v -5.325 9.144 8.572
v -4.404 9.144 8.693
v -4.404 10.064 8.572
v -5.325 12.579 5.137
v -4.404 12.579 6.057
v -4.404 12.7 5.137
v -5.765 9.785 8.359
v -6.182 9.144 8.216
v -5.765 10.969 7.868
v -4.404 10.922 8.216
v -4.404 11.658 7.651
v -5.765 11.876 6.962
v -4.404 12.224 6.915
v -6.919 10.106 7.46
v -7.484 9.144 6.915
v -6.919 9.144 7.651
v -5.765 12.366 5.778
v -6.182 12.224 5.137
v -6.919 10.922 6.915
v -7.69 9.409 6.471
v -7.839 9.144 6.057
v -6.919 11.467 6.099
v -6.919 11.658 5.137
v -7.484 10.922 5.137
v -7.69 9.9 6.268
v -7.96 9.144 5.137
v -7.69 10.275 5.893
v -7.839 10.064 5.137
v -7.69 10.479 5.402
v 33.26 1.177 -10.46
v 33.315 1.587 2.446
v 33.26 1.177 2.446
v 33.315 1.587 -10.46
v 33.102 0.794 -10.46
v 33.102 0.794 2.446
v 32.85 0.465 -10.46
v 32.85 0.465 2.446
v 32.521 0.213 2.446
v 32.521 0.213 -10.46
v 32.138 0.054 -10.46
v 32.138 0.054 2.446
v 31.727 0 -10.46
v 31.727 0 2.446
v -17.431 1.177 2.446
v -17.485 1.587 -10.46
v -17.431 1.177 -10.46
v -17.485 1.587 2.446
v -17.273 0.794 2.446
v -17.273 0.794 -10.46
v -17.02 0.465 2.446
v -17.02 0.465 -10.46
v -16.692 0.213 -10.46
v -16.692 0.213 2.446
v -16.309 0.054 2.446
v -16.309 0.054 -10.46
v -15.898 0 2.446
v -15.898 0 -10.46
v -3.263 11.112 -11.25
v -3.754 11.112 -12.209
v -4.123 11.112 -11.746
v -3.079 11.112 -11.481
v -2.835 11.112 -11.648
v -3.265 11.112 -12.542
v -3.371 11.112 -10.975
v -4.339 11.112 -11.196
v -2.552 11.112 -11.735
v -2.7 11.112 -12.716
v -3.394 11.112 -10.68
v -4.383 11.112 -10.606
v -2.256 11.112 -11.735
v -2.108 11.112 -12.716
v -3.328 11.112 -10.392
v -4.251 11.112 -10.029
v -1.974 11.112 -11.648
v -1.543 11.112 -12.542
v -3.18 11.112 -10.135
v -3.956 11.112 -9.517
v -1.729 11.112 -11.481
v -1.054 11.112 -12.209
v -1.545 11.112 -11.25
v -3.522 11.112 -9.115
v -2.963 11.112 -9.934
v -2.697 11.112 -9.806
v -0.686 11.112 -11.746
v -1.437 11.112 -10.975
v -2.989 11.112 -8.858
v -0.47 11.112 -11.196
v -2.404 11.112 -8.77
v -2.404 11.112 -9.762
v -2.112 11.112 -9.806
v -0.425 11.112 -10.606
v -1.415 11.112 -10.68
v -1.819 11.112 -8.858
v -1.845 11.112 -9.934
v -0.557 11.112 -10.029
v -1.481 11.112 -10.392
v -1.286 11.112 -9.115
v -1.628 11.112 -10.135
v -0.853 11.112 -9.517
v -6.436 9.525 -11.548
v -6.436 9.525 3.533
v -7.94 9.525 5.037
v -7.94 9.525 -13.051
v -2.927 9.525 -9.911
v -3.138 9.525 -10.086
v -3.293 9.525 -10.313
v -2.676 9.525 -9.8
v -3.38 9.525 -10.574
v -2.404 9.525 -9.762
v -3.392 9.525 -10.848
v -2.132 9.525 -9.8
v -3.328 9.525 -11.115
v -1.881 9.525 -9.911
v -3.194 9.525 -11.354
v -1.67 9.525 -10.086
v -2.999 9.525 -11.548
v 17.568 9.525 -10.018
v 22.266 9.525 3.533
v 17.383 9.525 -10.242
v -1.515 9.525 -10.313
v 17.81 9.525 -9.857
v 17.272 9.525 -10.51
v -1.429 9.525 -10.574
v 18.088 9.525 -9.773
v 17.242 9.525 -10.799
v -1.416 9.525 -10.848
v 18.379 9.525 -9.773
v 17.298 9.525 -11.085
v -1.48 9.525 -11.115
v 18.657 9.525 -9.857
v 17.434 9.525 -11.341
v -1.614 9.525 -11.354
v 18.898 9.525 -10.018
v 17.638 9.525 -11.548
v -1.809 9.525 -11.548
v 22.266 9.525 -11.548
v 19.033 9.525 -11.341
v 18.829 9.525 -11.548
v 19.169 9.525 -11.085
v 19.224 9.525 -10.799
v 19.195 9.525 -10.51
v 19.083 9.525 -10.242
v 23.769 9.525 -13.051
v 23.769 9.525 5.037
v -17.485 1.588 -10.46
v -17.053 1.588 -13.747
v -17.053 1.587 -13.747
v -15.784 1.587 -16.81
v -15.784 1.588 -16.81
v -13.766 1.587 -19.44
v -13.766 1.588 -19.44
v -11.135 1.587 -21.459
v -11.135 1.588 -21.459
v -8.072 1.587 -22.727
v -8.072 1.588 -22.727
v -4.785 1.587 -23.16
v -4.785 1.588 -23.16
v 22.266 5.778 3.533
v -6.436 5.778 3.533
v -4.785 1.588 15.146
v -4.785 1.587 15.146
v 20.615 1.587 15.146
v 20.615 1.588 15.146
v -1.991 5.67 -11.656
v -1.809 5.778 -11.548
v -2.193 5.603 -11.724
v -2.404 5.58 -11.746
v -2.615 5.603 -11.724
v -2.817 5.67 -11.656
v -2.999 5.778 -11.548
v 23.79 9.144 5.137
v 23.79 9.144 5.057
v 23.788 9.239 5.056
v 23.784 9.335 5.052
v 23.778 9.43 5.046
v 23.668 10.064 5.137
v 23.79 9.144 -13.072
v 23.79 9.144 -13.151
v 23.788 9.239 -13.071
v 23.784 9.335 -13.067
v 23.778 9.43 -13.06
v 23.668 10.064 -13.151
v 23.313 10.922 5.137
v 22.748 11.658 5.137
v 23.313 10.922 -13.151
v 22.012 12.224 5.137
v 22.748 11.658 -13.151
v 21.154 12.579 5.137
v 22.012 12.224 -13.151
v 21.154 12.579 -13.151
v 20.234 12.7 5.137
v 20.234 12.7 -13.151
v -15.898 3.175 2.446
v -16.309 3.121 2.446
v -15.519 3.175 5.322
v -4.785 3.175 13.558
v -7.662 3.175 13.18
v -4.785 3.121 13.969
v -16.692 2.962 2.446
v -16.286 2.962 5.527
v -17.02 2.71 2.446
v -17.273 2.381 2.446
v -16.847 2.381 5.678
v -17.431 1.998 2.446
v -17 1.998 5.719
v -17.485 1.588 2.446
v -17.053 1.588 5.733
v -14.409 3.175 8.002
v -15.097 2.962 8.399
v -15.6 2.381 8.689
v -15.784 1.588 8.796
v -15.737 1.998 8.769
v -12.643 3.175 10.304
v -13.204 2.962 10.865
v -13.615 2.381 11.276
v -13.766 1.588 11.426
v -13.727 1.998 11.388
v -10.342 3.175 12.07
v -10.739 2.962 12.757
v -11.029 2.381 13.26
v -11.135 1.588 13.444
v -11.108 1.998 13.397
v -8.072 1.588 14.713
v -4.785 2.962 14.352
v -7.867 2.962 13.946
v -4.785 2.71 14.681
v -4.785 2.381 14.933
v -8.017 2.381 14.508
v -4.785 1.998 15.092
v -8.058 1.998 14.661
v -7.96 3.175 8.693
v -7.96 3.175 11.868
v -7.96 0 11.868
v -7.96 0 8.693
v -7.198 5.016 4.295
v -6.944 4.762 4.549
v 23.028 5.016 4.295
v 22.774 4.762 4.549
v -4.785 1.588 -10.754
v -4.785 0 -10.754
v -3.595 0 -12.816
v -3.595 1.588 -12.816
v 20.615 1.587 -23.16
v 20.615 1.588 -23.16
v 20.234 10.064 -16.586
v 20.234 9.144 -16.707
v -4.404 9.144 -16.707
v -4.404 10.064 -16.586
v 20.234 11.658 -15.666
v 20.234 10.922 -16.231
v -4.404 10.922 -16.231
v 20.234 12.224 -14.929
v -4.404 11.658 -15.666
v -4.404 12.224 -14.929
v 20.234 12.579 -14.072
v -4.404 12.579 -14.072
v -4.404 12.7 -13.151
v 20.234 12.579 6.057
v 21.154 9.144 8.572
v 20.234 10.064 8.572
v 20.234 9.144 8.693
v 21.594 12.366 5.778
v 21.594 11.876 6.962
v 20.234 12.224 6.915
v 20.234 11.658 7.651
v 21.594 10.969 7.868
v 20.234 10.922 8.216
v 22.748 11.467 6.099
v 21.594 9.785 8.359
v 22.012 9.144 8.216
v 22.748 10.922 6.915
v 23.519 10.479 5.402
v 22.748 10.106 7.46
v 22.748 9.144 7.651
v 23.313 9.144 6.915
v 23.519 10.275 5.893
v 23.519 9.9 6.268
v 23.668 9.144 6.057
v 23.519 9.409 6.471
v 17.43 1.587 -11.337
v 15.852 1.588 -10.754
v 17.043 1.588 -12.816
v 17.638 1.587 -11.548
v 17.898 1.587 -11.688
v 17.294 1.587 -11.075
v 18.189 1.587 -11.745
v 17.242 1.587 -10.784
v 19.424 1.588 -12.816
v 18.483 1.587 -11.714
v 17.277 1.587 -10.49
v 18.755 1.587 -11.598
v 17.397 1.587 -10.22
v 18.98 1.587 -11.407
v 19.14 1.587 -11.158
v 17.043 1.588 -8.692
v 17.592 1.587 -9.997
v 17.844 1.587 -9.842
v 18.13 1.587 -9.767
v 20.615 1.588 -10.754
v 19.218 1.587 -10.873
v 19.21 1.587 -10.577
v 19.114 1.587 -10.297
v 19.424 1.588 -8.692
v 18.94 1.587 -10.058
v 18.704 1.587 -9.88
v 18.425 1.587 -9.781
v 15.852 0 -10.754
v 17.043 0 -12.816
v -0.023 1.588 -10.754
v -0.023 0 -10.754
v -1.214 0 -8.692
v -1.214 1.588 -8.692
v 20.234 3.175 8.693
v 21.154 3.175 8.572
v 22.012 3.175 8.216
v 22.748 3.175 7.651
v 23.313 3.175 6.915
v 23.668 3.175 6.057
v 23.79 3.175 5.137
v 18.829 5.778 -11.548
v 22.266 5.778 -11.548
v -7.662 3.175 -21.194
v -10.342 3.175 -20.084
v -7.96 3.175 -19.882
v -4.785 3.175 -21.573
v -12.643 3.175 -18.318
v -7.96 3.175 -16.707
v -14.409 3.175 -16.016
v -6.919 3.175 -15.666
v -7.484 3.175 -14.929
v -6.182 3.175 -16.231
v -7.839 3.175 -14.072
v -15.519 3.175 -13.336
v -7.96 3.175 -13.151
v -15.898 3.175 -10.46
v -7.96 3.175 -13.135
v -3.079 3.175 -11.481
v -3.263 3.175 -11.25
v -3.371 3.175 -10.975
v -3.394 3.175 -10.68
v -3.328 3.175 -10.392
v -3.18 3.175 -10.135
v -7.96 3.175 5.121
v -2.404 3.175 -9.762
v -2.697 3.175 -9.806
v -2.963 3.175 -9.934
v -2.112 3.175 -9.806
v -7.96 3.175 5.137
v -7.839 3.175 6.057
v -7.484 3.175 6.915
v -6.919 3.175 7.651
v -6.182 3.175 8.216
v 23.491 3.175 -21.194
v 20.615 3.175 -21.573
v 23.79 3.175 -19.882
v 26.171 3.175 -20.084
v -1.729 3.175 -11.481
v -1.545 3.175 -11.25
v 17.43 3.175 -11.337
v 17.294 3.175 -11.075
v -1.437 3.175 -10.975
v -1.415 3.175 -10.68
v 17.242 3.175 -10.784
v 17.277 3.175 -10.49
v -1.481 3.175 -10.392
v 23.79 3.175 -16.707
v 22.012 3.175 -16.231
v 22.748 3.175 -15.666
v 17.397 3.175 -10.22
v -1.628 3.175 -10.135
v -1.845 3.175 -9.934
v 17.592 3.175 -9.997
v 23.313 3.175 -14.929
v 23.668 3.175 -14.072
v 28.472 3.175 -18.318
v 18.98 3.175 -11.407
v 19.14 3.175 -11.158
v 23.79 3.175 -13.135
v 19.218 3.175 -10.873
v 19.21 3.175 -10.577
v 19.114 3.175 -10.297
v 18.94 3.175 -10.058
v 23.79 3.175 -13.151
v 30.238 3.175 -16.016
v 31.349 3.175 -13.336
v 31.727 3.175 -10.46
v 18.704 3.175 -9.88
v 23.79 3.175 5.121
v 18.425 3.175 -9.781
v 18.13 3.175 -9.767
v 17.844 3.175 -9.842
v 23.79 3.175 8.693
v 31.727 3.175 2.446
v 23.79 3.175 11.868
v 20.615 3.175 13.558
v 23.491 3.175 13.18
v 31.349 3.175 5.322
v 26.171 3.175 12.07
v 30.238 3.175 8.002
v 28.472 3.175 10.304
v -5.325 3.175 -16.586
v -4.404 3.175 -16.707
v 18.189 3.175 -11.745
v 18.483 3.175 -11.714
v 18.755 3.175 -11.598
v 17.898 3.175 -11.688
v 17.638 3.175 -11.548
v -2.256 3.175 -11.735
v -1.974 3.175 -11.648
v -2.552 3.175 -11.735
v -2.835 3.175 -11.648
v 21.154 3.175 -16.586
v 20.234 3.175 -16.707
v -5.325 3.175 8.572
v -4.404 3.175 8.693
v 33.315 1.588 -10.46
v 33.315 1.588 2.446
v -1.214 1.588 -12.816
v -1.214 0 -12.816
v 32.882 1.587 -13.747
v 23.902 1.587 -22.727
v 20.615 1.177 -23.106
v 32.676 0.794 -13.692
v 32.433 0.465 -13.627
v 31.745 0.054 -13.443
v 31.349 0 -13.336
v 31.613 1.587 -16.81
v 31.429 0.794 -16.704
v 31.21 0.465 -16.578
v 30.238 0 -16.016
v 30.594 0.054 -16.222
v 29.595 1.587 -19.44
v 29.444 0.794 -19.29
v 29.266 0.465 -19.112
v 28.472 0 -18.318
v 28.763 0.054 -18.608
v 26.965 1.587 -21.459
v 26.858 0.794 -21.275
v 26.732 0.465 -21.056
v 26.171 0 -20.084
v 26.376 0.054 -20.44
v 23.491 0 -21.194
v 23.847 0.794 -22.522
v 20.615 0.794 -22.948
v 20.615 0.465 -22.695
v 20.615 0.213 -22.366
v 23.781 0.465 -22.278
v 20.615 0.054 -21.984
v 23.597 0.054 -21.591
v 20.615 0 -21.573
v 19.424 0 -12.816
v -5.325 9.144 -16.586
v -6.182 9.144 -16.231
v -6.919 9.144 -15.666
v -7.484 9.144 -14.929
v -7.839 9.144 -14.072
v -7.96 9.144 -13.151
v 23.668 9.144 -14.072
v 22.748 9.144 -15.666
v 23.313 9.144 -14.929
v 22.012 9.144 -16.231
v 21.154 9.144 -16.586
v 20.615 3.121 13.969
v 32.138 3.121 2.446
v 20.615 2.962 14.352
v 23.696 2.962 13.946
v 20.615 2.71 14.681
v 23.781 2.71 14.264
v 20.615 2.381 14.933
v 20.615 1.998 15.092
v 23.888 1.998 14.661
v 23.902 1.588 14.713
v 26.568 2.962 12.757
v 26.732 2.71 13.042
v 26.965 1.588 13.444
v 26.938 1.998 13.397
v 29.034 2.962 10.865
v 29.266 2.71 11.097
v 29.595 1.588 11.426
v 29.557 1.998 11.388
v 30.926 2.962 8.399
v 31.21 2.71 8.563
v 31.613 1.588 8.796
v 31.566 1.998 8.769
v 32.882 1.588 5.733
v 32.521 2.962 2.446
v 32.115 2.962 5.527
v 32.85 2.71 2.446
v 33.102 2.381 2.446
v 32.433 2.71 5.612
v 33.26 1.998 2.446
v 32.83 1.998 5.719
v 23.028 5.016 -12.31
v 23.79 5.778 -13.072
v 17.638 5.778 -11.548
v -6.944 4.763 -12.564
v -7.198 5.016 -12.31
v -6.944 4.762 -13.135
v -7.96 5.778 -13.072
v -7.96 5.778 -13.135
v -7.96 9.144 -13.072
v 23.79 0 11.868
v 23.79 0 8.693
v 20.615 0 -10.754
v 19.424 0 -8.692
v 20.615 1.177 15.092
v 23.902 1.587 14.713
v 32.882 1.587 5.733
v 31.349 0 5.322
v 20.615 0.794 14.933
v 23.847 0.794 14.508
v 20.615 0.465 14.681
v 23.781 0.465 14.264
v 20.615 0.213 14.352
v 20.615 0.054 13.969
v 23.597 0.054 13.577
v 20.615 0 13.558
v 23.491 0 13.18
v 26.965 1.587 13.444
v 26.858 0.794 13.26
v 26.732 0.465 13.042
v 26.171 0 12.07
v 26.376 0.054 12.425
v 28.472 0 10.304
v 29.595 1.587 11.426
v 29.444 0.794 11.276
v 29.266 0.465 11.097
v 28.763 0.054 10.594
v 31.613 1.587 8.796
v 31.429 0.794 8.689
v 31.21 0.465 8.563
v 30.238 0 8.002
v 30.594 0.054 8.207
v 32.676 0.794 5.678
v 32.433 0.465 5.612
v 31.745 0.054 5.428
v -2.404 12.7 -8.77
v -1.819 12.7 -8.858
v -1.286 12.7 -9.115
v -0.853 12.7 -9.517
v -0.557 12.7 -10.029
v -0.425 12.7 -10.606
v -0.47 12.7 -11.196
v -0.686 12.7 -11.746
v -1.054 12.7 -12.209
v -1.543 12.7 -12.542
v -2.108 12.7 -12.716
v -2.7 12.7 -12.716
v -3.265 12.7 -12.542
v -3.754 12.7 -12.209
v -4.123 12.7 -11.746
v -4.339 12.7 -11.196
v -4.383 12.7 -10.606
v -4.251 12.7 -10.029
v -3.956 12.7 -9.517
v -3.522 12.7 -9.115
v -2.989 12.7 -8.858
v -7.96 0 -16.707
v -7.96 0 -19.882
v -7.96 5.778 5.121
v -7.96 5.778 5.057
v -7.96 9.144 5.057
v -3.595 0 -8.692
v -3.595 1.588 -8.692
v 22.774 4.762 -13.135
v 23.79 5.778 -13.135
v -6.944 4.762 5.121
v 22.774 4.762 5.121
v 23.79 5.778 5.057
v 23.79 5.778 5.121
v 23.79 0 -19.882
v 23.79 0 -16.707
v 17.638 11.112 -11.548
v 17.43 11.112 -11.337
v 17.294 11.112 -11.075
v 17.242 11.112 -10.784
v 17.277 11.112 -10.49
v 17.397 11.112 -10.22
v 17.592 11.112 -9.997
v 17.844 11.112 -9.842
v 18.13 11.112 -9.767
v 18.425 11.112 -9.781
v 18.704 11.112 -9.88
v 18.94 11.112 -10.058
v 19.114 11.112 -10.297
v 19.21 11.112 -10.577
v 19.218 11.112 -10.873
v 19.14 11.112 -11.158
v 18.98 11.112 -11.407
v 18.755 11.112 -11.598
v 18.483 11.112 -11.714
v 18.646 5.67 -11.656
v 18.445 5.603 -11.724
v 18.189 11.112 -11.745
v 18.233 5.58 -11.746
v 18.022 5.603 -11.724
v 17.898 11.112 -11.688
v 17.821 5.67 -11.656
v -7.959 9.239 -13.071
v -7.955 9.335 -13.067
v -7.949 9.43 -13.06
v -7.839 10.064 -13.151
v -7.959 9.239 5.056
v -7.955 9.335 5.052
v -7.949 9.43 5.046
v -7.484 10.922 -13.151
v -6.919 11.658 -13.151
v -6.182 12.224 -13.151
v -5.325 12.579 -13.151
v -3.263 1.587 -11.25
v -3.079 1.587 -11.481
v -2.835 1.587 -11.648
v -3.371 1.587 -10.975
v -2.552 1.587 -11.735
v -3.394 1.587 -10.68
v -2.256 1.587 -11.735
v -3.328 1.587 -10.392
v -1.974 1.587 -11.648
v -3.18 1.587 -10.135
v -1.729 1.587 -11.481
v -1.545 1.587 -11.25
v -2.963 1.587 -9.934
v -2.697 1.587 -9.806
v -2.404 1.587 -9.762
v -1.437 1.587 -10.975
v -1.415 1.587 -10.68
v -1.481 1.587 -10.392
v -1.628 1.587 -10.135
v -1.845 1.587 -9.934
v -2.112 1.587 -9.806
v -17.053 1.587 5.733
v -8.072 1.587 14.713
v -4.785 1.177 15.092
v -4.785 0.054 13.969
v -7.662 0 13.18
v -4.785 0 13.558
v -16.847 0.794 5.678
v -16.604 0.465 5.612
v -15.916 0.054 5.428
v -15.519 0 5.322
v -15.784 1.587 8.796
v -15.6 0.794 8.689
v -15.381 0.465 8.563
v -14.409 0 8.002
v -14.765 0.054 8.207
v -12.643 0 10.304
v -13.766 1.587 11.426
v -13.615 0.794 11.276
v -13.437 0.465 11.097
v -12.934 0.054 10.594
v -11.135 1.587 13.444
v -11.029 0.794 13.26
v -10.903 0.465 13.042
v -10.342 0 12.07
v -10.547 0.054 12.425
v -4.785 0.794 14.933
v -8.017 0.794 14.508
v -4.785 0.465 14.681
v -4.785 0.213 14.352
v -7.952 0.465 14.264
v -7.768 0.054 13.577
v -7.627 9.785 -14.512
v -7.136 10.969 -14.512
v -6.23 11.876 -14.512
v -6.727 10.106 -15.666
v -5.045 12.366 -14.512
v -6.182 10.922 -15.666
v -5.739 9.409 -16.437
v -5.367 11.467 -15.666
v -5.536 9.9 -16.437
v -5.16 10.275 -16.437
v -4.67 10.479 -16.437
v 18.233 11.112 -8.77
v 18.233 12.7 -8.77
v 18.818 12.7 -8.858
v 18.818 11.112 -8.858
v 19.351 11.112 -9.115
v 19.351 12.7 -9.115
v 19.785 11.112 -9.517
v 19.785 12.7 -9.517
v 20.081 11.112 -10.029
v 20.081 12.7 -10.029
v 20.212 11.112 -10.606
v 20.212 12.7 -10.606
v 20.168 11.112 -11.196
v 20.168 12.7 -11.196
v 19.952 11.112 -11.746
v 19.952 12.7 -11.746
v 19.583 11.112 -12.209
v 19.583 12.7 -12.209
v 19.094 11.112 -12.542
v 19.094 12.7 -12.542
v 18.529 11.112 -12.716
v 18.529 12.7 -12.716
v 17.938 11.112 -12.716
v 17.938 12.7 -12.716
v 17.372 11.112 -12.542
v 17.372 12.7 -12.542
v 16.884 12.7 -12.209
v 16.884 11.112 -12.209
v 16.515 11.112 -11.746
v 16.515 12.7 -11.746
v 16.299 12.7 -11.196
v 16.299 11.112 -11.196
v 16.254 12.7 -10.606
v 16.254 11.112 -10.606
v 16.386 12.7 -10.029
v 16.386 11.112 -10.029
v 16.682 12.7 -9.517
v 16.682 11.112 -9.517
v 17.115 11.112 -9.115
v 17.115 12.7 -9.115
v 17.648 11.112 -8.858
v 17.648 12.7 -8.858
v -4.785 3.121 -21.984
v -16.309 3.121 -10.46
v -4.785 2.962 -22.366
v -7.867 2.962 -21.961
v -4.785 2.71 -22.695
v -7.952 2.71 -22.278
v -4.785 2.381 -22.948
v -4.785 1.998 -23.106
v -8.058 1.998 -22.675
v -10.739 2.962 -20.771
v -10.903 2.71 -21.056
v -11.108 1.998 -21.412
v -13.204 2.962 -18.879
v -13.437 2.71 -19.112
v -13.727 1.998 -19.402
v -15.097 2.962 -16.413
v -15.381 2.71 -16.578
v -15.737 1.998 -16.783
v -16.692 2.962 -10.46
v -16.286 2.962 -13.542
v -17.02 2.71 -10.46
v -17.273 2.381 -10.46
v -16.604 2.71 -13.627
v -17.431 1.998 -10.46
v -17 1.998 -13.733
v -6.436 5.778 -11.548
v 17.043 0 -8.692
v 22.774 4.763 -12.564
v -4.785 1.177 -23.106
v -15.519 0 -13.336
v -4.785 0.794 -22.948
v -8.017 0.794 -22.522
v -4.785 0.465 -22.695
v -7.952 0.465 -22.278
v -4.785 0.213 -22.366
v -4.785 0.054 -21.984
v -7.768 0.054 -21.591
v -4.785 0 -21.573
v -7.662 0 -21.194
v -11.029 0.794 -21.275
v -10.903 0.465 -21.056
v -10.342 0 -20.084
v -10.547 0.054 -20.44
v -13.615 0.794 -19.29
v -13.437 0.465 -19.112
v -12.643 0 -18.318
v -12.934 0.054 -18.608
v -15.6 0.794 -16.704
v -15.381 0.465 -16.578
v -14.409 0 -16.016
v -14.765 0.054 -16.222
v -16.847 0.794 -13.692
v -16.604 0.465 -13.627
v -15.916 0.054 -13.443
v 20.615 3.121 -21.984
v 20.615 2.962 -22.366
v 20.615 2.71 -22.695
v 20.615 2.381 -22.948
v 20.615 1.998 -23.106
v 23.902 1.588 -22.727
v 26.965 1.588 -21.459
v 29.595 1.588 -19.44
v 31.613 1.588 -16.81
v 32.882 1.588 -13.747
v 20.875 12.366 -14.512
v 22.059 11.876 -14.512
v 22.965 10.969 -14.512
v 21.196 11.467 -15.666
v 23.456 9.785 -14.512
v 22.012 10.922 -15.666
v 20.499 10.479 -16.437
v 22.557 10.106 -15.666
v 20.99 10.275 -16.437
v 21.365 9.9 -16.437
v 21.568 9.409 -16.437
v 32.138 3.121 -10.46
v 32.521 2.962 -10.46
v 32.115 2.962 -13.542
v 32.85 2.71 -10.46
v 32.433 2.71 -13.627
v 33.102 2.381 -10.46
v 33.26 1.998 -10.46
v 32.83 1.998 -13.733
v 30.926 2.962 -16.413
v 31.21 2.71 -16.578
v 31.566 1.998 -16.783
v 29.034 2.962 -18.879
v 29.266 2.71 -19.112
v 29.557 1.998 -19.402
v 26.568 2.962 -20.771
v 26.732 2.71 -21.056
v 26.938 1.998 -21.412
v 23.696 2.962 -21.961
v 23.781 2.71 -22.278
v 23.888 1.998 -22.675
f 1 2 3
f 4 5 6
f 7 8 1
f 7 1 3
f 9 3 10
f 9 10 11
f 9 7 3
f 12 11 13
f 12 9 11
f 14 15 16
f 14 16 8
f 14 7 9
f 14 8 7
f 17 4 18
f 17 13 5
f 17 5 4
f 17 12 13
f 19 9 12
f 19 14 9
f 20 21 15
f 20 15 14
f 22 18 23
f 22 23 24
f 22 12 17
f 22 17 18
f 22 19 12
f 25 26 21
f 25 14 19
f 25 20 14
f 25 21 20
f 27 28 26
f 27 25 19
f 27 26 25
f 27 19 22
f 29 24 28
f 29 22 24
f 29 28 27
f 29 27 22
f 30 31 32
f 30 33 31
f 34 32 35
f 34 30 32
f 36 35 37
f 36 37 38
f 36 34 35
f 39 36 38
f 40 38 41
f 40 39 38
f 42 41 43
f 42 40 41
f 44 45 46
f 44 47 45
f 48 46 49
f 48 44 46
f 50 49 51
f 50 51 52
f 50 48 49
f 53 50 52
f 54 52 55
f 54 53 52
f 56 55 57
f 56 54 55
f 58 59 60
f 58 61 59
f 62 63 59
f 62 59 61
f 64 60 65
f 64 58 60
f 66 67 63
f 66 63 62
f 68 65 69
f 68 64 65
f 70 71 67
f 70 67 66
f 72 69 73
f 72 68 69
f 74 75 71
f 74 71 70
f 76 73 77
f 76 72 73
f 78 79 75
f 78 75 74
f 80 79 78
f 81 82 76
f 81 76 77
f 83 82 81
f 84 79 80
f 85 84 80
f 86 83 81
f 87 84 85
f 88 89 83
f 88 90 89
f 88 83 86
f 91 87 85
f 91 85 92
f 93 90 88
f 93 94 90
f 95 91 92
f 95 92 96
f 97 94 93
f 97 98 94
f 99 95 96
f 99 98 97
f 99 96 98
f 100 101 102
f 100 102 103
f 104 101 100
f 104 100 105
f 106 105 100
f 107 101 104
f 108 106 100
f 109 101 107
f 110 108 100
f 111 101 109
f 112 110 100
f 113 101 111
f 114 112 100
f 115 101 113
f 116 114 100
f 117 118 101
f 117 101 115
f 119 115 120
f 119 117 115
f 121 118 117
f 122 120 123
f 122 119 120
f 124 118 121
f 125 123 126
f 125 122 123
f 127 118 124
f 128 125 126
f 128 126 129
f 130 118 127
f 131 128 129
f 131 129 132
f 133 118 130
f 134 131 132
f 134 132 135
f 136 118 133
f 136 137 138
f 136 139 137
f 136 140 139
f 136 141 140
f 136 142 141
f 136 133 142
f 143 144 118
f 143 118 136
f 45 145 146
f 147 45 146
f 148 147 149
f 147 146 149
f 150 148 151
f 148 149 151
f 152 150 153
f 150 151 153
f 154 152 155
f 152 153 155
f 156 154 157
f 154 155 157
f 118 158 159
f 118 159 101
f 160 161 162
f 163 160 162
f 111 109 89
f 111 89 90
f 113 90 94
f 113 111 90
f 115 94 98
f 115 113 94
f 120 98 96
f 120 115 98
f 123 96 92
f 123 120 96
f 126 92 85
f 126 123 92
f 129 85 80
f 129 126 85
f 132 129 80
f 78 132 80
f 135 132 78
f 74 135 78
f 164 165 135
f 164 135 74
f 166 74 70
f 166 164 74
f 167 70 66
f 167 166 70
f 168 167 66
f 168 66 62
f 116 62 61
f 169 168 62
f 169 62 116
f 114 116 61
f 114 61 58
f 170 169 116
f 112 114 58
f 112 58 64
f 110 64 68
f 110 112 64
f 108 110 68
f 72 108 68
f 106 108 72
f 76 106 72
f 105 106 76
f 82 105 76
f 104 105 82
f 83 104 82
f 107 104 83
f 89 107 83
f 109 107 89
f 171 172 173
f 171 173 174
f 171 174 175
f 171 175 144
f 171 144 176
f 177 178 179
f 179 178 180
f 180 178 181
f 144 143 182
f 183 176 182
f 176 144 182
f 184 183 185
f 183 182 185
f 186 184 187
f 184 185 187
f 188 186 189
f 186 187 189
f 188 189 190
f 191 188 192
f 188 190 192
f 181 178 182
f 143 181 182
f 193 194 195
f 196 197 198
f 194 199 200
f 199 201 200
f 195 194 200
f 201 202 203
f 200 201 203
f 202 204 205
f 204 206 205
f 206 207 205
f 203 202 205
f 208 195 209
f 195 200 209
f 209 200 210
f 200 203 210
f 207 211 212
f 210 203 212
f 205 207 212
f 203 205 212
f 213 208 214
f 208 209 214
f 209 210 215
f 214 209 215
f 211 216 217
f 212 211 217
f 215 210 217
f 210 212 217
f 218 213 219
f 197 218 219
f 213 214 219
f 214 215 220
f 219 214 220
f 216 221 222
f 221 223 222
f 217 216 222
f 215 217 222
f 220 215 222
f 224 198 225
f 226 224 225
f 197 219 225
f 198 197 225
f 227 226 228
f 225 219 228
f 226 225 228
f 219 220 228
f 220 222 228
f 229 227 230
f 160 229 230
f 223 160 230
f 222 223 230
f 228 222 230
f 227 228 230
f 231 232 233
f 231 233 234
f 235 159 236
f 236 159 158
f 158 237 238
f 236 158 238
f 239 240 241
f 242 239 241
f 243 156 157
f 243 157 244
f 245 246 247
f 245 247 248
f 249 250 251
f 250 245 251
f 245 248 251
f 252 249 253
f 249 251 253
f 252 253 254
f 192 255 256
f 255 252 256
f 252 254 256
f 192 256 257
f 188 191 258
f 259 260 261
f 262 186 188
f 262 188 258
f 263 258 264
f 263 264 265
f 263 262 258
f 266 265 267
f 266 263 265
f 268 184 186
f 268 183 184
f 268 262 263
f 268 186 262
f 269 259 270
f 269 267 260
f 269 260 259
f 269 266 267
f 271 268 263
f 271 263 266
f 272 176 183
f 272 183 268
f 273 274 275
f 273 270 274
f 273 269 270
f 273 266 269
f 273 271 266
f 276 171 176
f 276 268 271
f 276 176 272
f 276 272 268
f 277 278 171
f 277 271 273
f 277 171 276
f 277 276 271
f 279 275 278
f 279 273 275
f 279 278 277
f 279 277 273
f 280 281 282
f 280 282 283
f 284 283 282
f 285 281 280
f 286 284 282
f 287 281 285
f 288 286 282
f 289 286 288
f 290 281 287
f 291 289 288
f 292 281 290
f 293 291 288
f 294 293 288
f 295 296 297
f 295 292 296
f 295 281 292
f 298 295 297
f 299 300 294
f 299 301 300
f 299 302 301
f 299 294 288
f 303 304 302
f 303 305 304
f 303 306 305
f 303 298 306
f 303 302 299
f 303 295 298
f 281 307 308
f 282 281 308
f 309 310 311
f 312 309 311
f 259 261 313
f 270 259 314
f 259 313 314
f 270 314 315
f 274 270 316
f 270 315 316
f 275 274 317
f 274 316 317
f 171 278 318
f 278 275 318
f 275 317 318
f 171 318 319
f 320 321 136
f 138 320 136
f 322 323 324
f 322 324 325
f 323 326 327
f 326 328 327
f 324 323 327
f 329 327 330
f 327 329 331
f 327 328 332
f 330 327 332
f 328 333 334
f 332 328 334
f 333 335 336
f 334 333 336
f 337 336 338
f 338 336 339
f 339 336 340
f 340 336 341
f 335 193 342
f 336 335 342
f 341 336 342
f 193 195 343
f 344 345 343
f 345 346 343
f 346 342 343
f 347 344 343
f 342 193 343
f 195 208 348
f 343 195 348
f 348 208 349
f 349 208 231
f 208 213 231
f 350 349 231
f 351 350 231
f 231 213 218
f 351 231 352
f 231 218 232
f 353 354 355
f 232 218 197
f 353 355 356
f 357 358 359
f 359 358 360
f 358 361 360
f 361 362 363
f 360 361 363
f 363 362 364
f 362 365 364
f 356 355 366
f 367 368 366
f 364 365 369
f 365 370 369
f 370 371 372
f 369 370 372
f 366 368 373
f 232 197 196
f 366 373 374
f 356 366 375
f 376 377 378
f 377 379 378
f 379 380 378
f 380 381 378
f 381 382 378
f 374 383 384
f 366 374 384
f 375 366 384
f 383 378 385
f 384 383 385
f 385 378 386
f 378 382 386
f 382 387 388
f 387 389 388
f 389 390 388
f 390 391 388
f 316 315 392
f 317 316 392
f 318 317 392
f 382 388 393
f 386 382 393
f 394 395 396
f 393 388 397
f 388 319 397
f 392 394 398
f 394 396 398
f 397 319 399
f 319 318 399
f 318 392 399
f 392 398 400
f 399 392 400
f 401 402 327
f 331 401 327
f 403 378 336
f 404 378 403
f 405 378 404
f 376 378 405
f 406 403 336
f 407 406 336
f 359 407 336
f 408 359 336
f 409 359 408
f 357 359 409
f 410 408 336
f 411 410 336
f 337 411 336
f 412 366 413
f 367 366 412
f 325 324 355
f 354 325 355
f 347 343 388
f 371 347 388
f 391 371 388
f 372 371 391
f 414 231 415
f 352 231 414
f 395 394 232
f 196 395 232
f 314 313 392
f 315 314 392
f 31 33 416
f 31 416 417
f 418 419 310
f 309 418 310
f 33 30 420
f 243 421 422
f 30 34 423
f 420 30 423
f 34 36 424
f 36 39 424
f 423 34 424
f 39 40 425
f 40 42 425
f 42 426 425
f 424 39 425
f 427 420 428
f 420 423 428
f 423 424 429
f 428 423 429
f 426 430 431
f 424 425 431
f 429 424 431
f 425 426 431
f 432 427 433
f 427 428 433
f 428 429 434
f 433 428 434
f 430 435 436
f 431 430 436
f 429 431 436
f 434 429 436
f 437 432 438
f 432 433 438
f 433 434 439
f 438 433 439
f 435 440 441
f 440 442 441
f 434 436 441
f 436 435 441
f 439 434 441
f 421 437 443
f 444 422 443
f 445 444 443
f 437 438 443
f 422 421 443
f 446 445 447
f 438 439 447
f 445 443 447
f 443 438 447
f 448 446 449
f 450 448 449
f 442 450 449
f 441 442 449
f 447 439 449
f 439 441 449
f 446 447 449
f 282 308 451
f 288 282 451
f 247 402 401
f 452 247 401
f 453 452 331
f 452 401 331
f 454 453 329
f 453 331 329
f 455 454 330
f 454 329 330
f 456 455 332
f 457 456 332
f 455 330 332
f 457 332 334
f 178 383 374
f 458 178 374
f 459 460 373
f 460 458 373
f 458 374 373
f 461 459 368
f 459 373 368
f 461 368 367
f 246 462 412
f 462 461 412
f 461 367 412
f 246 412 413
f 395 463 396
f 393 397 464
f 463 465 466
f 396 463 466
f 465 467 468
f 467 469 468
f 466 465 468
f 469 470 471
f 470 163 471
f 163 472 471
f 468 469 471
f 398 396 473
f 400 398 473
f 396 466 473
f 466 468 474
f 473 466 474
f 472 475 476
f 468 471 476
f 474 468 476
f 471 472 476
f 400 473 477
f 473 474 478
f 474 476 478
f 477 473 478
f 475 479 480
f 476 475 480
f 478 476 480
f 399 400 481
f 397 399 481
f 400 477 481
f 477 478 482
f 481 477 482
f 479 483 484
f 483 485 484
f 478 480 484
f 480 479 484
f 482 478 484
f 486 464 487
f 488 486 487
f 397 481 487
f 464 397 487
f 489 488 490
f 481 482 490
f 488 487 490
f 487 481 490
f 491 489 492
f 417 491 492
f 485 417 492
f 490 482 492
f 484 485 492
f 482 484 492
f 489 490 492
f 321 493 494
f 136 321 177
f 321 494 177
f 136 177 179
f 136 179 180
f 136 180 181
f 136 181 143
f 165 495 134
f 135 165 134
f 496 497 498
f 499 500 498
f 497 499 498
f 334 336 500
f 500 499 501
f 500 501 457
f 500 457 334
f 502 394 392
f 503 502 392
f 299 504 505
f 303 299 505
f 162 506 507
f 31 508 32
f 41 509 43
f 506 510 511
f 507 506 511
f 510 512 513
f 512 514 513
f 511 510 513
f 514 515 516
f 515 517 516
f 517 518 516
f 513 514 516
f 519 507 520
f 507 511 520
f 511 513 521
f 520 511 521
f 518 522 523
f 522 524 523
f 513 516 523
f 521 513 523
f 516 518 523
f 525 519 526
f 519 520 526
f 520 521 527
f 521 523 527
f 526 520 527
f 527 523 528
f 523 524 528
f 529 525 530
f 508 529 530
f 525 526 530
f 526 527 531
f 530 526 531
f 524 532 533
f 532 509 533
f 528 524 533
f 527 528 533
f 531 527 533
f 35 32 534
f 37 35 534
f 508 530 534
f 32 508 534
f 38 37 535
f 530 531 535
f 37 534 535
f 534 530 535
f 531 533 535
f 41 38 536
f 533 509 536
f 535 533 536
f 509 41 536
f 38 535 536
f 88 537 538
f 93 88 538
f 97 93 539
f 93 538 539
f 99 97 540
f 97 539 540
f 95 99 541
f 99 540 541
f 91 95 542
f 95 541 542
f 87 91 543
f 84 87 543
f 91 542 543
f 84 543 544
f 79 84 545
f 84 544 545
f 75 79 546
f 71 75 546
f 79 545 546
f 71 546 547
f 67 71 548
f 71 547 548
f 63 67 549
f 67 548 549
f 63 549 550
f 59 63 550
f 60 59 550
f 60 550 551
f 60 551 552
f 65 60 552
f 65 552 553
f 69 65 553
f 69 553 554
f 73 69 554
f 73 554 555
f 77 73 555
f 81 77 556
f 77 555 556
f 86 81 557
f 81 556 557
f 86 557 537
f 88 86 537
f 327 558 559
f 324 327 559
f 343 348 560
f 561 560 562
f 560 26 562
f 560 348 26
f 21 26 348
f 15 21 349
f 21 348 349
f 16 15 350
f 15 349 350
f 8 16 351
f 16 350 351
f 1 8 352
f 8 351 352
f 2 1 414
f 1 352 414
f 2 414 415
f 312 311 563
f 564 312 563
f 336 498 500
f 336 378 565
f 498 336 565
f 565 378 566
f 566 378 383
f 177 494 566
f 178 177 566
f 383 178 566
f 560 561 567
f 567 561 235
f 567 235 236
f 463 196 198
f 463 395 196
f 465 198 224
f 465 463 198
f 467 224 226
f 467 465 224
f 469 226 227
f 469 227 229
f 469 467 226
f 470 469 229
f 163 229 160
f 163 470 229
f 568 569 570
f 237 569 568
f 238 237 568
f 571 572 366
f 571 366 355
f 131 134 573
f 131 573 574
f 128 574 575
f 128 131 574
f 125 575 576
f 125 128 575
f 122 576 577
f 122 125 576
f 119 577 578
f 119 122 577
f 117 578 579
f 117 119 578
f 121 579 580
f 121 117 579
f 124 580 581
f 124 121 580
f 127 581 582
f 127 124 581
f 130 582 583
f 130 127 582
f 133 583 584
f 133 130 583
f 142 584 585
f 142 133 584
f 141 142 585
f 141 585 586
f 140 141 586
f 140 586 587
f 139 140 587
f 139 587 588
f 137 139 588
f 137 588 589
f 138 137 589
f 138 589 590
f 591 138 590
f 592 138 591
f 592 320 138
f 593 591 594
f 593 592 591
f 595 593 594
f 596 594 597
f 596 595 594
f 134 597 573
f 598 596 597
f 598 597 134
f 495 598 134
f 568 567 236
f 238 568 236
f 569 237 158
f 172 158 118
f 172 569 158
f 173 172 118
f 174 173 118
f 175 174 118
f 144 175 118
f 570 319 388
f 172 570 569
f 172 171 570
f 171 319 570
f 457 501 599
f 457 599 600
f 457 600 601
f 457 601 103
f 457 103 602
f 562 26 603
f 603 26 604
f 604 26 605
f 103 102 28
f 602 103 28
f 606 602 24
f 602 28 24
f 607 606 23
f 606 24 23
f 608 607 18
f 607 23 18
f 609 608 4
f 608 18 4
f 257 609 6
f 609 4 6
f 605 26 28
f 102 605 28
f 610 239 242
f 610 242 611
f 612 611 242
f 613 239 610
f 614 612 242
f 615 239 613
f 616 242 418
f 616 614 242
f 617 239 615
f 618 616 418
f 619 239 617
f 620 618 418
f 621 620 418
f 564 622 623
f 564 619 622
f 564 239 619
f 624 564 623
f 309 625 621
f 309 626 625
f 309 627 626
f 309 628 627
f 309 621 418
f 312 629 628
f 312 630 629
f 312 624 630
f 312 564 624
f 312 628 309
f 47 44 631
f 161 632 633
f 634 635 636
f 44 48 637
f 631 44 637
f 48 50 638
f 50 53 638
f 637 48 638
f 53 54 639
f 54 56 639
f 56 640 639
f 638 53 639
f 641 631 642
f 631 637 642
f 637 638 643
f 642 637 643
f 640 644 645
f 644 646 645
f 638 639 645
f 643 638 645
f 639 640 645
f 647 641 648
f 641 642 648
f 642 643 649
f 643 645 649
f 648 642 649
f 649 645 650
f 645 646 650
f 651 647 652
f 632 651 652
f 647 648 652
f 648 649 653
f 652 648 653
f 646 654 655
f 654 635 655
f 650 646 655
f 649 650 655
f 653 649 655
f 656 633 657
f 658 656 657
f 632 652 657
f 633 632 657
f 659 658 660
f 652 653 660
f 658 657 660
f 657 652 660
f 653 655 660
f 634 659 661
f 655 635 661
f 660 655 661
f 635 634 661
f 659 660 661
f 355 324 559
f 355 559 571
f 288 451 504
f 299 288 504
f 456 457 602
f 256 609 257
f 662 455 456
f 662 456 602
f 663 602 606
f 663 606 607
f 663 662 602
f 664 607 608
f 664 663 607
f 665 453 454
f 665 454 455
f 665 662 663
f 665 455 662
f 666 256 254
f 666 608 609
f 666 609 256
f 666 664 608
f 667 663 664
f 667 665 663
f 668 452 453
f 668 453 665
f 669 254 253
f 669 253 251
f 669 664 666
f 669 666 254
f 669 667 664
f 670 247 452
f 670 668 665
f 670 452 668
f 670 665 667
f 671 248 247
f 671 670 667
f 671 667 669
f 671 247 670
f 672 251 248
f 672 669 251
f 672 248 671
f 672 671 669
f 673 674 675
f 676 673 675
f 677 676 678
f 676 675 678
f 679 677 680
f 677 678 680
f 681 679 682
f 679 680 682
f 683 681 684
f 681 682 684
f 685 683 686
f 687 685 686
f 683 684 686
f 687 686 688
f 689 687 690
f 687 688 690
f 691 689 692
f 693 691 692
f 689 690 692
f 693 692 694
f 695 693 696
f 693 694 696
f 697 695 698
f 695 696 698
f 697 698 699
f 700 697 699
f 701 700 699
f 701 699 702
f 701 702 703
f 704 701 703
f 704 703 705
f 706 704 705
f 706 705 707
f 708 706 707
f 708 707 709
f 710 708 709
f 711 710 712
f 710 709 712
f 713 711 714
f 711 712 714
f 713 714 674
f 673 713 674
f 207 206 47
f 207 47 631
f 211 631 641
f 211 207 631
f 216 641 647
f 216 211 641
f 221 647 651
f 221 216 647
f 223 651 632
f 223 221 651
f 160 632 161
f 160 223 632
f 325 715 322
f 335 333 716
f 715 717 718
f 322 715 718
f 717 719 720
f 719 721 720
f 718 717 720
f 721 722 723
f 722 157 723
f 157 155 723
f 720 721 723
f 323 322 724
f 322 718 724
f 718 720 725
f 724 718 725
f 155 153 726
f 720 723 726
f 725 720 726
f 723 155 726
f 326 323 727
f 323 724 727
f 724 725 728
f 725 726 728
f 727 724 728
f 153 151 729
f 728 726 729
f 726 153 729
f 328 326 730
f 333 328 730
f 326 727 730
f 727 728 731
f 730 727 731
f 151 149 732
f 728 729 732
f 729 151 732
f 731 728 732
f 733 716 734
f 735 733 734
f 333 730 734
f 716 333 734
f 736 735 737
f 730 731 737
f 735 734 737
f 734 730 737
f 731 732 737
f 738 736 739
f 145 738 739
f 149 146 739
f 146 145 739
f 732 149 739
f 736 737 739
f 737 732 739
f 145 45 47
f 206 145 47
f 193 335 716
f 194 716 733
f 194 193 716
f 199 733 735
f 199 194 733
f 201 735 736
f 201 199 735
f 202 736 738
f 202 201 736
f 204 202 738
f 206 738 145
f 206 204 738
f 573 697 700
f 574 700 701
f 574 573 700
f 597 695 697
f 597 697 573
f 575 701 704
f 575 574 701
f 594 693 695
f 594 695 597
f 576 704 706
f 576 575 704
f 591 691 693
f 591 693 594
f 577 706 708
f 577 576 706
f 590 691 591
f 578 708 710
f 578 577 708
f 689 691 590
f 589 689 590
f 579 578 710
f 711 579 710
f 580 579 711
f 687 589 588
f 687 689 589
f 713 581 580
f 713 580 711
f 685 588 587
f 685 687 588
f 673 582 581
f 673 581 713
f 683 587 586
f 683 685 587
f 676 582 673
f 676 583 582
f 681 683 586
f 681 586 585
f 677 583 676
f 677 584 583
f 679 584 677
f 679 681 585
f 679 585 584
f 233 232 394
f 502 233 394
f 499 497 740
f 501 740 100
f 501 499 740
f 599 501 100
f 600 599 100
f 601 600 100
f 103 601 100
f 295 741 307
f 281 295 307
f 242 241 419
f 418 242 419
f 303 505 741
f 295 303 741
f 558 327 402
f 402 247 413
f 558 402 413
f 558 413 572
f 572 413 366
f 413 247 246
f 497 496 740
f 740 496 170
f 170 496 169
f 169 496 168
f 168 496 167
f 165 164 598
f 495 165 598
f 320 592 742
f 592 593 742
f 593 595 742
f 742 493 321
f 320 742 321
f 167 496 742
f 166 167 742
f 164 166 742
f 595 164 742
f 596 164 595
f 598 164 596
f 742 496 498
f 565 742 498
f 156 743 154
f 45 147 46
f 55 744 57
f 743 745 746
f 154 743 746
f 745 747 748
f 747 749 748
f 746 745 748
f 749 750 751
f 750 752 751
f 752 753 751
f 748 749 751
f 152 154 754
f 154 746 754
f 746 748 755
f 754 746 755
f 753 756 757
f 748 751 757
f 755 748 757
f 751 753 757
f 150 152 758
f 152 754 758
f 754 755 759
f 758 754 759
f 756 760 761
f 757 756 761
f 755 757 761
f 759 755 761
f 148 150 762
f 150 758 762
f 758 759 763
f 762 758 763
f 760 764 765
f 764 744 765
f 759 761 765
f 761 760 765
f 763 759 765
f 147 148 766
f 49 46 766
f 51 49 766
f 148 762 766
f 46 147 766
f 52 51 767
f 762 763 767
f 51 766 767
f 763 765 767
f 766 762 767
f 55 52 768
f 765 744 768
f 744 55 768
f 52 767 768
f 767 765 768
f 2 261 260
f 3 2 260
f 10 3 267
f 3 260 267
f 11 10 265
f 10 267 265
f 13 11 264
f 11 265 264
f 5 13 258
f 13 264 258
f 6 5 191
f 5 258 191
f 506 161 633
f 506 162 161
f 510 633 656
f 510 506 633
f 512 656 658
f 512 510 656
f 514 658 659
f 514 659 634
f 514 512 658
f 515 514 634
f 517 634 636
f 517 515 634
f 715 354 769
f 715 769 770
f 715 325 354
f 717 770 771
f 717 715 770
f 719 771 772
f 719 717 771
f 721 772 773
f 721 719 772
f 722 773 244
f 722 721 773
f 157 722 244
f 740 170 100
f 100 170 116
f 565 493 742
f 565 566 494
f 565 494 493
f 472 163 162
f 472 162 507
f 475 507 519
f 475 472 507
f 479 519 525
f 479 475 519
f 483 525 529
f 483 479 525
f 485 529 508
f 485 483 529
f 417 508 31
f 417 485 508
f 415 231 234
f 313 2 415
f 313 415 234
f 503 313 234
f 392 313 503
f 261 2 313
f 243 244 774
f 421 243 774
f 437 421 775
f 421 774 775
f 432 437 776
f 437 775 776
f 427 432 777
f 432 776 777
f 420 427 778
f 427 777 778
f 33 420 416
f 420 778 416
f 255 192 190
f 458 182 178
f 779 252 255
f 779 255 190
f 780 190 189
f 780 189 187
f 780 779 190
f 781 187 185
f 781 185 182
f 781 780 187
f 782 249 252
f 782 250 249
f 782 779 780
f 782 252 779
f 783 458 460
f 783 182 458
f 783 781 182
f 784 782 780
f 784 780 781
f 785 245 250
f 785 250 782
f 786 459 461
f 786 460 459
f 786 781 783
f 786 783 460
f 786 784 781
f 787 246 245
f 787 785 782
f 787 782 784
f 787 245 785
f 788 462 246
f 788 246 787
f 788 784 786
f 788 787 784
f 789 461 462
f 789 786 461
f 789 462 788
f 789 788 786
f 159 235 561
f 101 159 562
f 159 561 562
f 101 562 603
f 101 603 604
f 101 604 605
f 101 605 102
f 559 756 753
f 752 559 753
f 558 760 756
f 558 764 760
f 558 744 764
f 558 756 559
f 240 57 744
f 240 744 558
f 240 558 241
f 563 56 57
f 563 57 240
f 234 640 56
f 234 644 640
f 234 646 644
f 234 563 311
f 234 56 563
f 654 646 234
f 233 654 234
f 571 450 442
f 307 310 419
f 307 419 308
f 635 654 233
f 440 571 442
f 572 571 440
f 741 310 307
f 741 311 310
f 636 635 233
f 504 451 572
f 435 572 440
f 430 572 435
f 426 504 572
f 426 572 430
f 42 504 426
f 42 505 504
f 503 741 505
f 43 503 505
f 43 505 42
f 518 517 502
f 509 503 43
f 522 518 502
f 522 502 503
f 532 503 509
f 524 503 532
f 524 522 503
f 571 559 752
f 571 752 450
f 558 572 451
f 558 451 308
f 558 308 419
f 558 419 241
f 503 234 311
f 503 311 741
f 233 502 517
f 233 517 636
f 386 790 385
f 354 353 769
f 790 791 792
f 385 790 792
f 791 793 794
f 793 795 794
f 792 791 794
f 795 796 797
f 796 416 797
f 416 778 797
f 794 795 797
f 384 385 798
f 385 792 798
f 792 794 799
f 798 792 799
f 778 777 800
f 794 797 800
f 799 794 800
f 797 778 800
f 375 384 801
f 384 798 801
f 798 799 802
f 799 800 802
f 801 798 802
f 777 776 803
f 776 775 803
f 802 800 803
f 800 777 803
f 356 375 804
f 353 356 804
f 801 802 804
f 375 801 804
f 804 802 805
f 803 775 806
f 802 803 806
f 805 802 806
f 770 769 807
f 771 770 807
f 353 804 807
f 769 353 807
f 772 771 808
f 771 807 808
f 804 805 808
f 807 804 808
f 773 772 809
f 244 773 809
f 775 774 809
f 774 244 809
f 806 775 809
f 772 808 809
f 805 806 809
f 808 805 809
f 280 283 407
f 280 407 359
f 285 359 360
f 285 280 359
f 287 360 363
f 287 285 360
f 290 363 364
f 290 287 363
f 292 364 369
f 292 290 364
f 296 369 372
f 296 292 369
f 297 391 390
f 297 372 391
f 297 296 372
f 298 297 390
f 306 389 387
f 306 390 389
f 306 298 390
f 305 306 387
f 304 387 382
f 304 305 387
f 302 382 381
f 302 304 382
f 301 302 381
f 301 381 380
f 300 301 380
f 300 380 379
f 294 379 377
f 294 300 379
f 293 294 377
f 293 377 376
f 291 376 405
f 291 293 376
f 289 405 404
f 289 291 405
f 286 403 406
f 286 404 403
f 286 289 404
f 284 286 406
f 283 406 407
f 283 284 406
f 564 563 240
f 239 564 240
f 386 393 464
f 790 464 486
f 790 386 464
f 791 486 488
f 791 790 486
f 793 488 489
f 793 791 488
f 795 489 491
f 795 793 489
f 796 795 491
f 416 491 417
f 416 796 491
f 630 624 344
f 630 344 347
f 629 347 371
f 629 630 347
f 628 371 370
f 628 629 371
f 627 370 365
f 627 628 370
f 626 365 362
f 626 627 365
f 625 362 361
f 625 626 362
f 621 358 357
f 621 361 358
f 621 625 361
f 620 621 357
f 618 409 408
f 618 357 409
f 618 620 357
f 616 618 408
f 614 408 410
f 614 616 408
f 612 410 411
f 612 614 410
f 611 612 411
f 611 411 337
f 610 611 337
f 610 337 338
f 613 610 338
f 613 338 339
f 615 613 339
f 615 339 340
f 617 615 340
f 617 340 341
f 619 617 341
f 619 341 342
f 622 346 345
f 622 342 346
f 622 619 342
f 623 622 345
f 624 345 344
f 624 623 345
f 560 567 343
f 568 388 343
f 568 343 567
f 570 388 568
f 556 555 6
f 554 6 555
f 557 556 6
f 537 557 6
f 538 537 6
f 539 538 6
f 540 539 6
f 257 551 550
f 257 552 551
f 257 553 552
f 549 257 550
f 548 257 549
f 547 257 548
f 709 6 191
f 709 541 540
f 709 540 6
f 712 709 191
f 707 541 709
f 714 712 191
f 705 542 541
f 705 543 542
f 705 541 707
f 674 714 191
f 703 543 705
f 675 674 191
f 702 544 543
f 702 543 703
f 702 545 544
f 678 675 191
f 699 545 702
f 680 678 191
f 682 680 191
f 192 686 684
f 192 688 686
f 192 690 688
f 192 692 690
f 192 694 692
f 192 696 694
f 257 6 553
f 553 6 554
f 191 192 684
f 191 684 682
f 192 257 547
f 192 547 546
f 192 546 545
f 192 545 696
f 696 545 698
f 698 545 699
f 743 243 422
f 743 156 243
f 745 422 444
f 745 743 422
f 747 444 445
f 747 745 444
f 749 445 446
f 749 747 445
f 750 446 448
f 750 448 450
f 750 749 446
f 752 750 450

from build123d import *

# Parameters (mm, degrees)
SKETCH1_W               = 31.75
SKETCH1_H               = 25.4
BOSS_EXTRUDE1_DEPTH     = 12.7
SKETCH2_W               = 18.25625
SKETCH2_H               = 6.35
CUT_EXTRUDE3_DEPTH      = 39.058949894
SKETCH4_W               = 1.5875
SKETCH4_H               = 4.7625
BOSS_EXTRUDE2_DEPTH     = 31.75
CUT_EXTRUDE5_DEPTH      = 31.590858593
CUT_EXTRUDE5_DEPTH_BACK = 31.590858593
SKETCH5_R               = 0.9921875
CUT_EXTRUDE6_DEPTH      = 1.5875
SKETCH7_R               = 1.984375
CUT_EXTRUDE7_DEPTH      = 1.5875
SKETCH8_W               = 50.8
SKETCH8_H               = 38.305926372
SKETCH8_W_2             = 31.75
SKETCH8_H_2             = 25.4
BOSS_EXTRUDE3_DEPTH     = 3.175
SKETCH10_W              = 31.75
SKETCH10_H              = 3.175
CUT_EXTRUDE8_DEPTH      = 42.677098196
FILLET6_R               = 12.7
CHAMFER1_SIZE           = 1.016
CHAMFER2_SIZE           = 1.524
FILLET7_R               = 3.556
FILLET10_R              = 1.5875


# Some blends are built 0.0001 mm under size
with BuildPart() as part:
    # Sketch1 → Boss-Extrude1 (new body)
    with BuildSketch(Plane(origin=(0, 0, 0), x_dir=(1, 0, 0), z_dir=(0, 1, 0))):
        with Locations((7.914574134, 4.007219009)):
            Rectangle(SKETCH1_W, SKETCH1_H)
    extrude(amount=BOSS_EXTRUDE1_DEPTH)

    # Sketch2 → Cut-Extrude3 (cut, through all)
    with BuildSketch(Plane(origin=(23.789574134, 0, 0), x_dir=(0, 0, -1), z_dir=(1, 0, 0))):
        with Locations((4.007219009, 6.35)):
            Rectangle(SKETCH2_W, SKETCH2_H)
    extrude(amount=-CUT_EXTRUDE3_DEPTH, mode=Mode.SUBTRACT)

    # Sketch4 → Boss-Extrude2 (add, through all)
    with BuildSketch(Plane(origin=(23.789574134, 0, 0), x_dir=(0, 0, -1), z_dir=(1, 0, 0))):
        with Locations((-4.327155991, 7.14375)):
            Rectangle(SKETCH4_W, SKETCH4_H)
        with Locations((12.341594009, 7.14375)):
            Rectangle(SKETCH4_W, SKETCH4_H)
    extrude(amount=-BOSS_EXTRUDE2_DEPTH)

    # Sketch5 → Cut-Extrude5 (cut, two sides: drawn at the far end of the back side and taken through both)
    with BuildSketch(Plane(origin=(0, 3.175, 0), x_dir=(1, 0, 0), z_dir=(0, 1, 0)).offset(-CUT_EXTRUDE5_DEPTH_BACK)):
        with Locations(Location((-2.404175866, 10.754094009, 0), (0, 0, 270))):
            Circle(SKETCH5_R)
        with Locations(Location((18.233324134, 10.754094009, 0), (0, 0, 126.869897646))):
            Circle(SKETCH5_R)
    extrude(amount=CUT_EXTRUDE5_DEPTH + CUT_EXTRUDE5_DEPTH_BACK, mode=Mode.SUBTRACT)

    # Sketch6 → Cut-Extrude6 (cut)
    with BuildSketch(Plane.XZ):
        Polygon((-0.022925866, -10.754094009), (-1.213550866, -8.691871016), (-3.594800866, -8.691871016), (-4.785425866, -10.754094009), (-3.594800866, -12.816317002), (-1.213550866, -12.816317002), align=None)
        Polygon((20.614574134, -10.754094009), (19.423949134, -8.691871016), (17.042699134, -8.691871016), (15.852074134, -10.754094009), (17.042699134, -12.816317002), (19.423949134, -12.816317002), align=None)
    extrude(amount=-CUT_EXTRUDE6_DEPTH, mode=Mode.SUBTRACT)

    # Sketch7 → Cut-Extrude7 (cut)
    with BuildSketch(Plane(origin=(0, 12.7, 0), x_dir=(1, 0, 0), z_dir=(0, 1, 0))):
        with Locations(Location((-2.404175866, 10.754094009, 0), (0, 0, 270))):
            Circle(SKETCH7_R)
        with Locations(Location((18.233324134, 10.754094009, 0), (0, 0, 270))):
            Circle(SKETCH7_R)
    extrude(amount=-CUT_EXTRUDE7_DEPTH, mode=Mode.SUBTRACT)

    # Sketch8 → Boss-Extrude3 (add)
    with BuildSketch(Plane.XZ):
        with Locations((7.914574134, -4.007219009)):
            Rectangle(SKETCH8_W, SKETCH8_H)
        with Locations((7.914574134, -4.007219009)):
            Rectangle(SKETCH8_W_2, SKETCH8_H_2, mode=Mode.SUBTRACT)
    extrude(amount=-BOSS_EXTRUDE3_DEPTH)

    # Sketch10 → Cut-Extrude8 (cut, through all)
    with BuildSketch(Plane(origin=(0, 3.175, 0), x_dir=(1, 0, 0), z_dir=(0, 1, 0))):
        with Locations((7.914574134, 18.294719009)):
            Rectangle(SKETCH10_W, SKETCH10_H)
        with Locations((7.914574134, -10.280280991)):
            Rectangle(SKETCH10_W, SKETCH10_H)
    extrude(amount=-CUT_EXTRUDE8_DEPTH, mode=Mode.SUBTRACT)

    # Fillet6
    fillet6_edges = [part.edges().sort_by_distance(p)[0] for p in [
        (-17.485425866, 1.5875, 15.145744177),
        (33.314574134, 1.5875, 15.145744177),
        (33.314574134, 1.5875, -23.160182195),
        (-17.485425866, 1.5875, -23.160182195),
    ]]
    fillet(fillet6_edges, radius=FILLET6_R)

    # Chamfer1
    # the kernel refuses this chamfer: 1.016 mm, written as the material it takes off along each edge
    with BuildSketch(Plane(origin=(-7.960425866, 4.7625, 0.920576075), x_dir=(-0.027495876610586435, 0.9996219169112968, 0), z_dir=(0, 0, 1)), Plane(origin=(-7.960425866, 4.7625, -13.135344009), x_dir=(-0.027495876610586435, 0.9996219169112968, 1.1185418764848949e-15), z_dir=(0, 0, 1))) as chamfer1_piece_1:
        Polygon((CHAMFER1_SIZE * 0.999621916911, -CHAMFER1_SIZE * 0.0274958766106), (-CHAMFER1_SIZE * 0.0274958766106, -CHAMFER1_SIZE * 0.999621916911), (0, 0), align=None)
    extrude(amount=4.200329916, mode=Mode.SUBTRACT)
    with BuildSketch(Plane(origin=(26.402404049, 4.7625, 3.533405991), x_dir=(0, 0.9996219169112968, -0.027495876610586435), z_dir=(-1, 0, 0))) as chamfer1_piece_2:
        Polygon((CHAMFER1_SIZE * 0.999621916911, -CHAMFER1_SIZE * 0.0274958766106), (-CHAMFER1_SIZE * 0.0274958766106, -CHAMFER1_SIZE * 0.999621916911), (0, 0), align=None)
    extrude(amount=36.975659832, mode=Mode.SUBTRACT)
    with BuildSketch(Plane(origin=(23.789574134, 4.7625, 0.920576075), x_dir=(0.027495876610587285, 0.9996219169112968, 0), z_dir=(0, 0, 1)), Plane(origin=(23.789574134, 4.7625, -13.135344009), x_dir=(0.027495876610587285, 0.9996219169112968, 1.1185418764848949e-15), z_dir=(0, 0, 1))) as chamfer1_piece_3:
        Polygon((CHAMFER1_SIZE * 0.999621916911, CHAMFER1_SIZE * 0.0274958766106), (-CHAMFER1_SIZE * 0.0274958766106, CHAMFER1_SIZE * 0.999621916911), (0, 0), align=None)
    extrude(amount=4.200329916, mode=Mode.SUBTRACT)
    with BuildSketch(Plane(origin=(-0.386658451, 4.7625, -11.547844009), x_dir=(0, -0.027495876610585605, -0.9996219169112968), z_dir=(-1, 0, 0)), Plane(origin=(26.402404049, 4.7625, -11.547844009), x_dir=(0, -0.027495876610585605, -0.9996219169112968), z_dir=(-1, 0, 0))) as chamfer1_piece_4:
        Polygon((CHAMFER1_SIZE * 0.999621916911, -CHAMFER1_SIZE * 0.0274958766106), (-CHAMFER1_SIZE * 0.0274958766106, -CHAMFER1_SIZE * 0.999621916911), (0, 0), align=None)
    extrude(amount=10.186597332, mode=Mode.SUBTRACT)
    with BuildSketch(Plane(origin=(20.250841549, 4.7625, -11.547844009), x_dir=(0, -0.027495876610585605, -0.9996219169112968), z_dir=(-1, 0, 0))) as chamfer1_piece_5:
        Polygon((CHAMFER1_SIZE * 0.999621916911, -CHAMFER1_SIZE * 0.0274958766106), (-CHAMFER1_SIZE * 0.0274958766106, -CHAMFER1_SIZE * 0.999621916911), (0, 0), align=None)
    extrude(amount=24.672534832, mode=Mode.SUBTRACT)

    # Chamfer2
    chamfer2_edges = [part.edges().sort_by_distance(p)[0] for p in [
        (-7.960425866, 7.65175, 3.533405991),
        (23.789574134, 7.65175, 3.533405991),
        (-7.960425866, 7.65175, -11.547844009),
        (23.789574134, 7.65175, -11.547844009),
    ]]
    chamfer(chamfer2_edges, length=CHAMFER2_SIZE)

    # Fillet7
    # the kernel refuses this fillet: 3.556 mm, written as the material it takes off along each edge
    with BuildSketch(Plane(origin=(20.233574134, 9.144, 5.136780991), x_dir=(0, 0, 1), z_dir=(1, 0, 0))) as fillet7_piece_1_section:
        Polygon((0, 0), (FILLET7_R * 1.02, 0), (FILLET7_R * 1.02, -FILLET7_R * 1.02), (0, -FILLET7_R * 1.02), align=None)
    fillet7_piece_1 = extrude(amount=FILLET7_R * 1.02, mode=Mode.PRIVATE)
    fillet7_piece_1 = fillet7_piece_1 - Plane(origin=(20.233574134, 9.144, 5.136780991), x_dir=(0, -0.7071067811865475, -0.7071067811865475), z_dir=(1, 0, 0)) * Sphere(FILLET7_R, mode=Mode.PRIVATE)
    add(fillet7_piece_1, mode=Mode.SUBTRACT)
    with BuildSketch(Plane(origin=(-4.404425866, 9.144, 5.136780991), x_dir=(0, 0, 1), z_dir=(-1, 0, 0))) as fillet7_piece_2_section:
        Polygon((0, 0), (FILLET7_R * 1.02, 0), (FILLET7_R * 1.02, FILLET7_R * 1.02), (0, FILLET7_R * 1.02), align=None)
    fillet7_piece_2 = extrude(amount=FILLET7_R * 1.02, mode=Mode.PRIVATE)
    fillet7_piece_2 = fillet7_piece_2 - Plane(origin=(-4.404425866, 9.144, 5.136780991), x_dir=(0, -0.7071067811865475, -0.7071067811865475), z_dir=(-1, 0, 0)) * Sphere(FILLET7_R, mode=Mode.PRIVATE)
    add(fillet7_piece_2, mode=Mode.SUBTRACT)
    with BuildSketch(Plane(origin=(20.233574134, 9.144, -13.151219009), x_dir=(1, 0, 0), z_dir=(0, 0, -1))) as fillet7_piece_3_section:
        Polygon((0, 0), (FILLET7_R * 1.02, 0), (FILLET7_R * 1.02, -FILLET7_R * 1.02), (0, -FILLET7_R * 1.02), align=None)
    fillet7_piece_3 = extrude(amount=FILLET7_R * 1.02, mode=Mode.PRIVATE)
    fillet7_piece_3 = fillet7_piece_3 - Plane(origin=(20.233574134, 9.144, -13.151219009), x_dir=(-0.7071067811865475, -0.7071067811865475, 0), z_dir=(0, 0, -1)) * Sphere(FILLET7_R, mode=Mode.PRIVATE)
    add(fillet7_piece_3, mode=Mode.SUBTRACT)
    with BuildSketch(Plane(origin=(-4.404425866, 9.144, -13.151219009), x_dir=(-1, 0, 0), z_dir=(0, 0, -1))) as fillet7_piece_4_section:
        Polygon((0, 0), (FILLET7_R * 1.02, 0), (FILLET7_R * 1.02, FILLET7_R * 1.02), (0, FILLET7_R * 1.02), align=None)
    fillet7_piece_4 = extrude(amount=FILLET7_R * 1.02, mode=Mode.PRIVATE)
    fillet7_piece_4 = fillet7_piece_4 - Plane(origin=(-4.404425866, 9.144, -13.151219009), x_dir=(0.7071067811865475, -0.7071067811865475, 0), z_dir=(0, 0, -1)) * Sphere(FILLET7_R, mode=Mode.PRIVATE)
    add(fillet7_piece_4, mode=Mode.SUBTRACT)
    with BuildSketch(Plane(origin=(20.233574134, 12.7, 8.692780991), x_dir=(0, -1, 0), z_dir=(-1, 0, 0))) as fillet7_piece_5:
        with BuildLine():
            CenterArc((FILLET7_R, -FILLET7_R), FILLET7_R, 90, 90)
            Line((0, -FILLET7_R), (0, 0))
            Line((0, 0), (FILLET7_R, 0))
        make_face()
    extrude(amount=24.638, mode=Mode.SUBTRACT)
    with BuildSketch(Plane(origin=(23.789574134, 3.175, 8.692780991), x_dir=(-1, 0, 0), z_dir=(0, 1, 0)), Plane(origin=(-7.960425866, 3.175, -16.707219009), x_dir=(1, 0, 0), z_dir=(0, 1, 0))) as fillet7_piece_6:
        with BuildLine():
            CenterArc((FILLET7_R, -FILLET7_R), FILLET7_R, 90, 90)
            Line((0, -FILLET7_R), (0, 0))
            Line((0, 0), (FILLET7_R, 0))
        make_face()
    extrude(amount=5.969, mode=Mode.SUBTRACT)
    with BuildSketch(Plane(origin=(23.789574134, 12.7, -13.151219009), x_dir=(-1, 0, 0), z_dir=(0, 0, 1)), Plane(origin=(-7.960425866, 12.7, 5.136780991), x_dir=(1, 0, 0), z_dir=(0, 0, -1))) as fillet7_piece_7:
        with BuildLine():
            CenterArc((FILLET7_R, FILLET7_R), FILLET7_R, 180, 90)
            Line((0, FILLET7_R), (0, 0))
            Line((0, 0), (FILLET7_R, 0))
        make_face()
    extrude(amount=18.288, mode=Mode.SUBTRACT)
    with BuildSketch(Plane(origin=(23.789574134, 3.175, -16.707219009), x_dir=(-1, 0, 0), z_dir=(0, 1, 0)), Plane(origin=(-7.960425866, 3.175, 8.692780991), x_dir=(1, 0, 0), z_dir=(0, 1, 0))) as fillet7_piece_8:
        with BuildLine():
            CenterArc((FILLET7_R, FILLET7_R), FILLET7_R, 180, 90)
            Line((0, FILLET7_R), (0, 0))
            Line((0, 0), (FILLET7_R, 0))
        make_face()
    extrude(amount=5.969, mode=Mode.SUBTRACT)
    with BuildSketch(Plane(origin=(-4.404425866, 12.7, -16.707219009), x_dir=(0, 0, 1), z_dir=(1, 0, 0))) as fillet7_piece_9:
        with BuildLine():
            CenterArc((FILLET7_R, FILLET7_R), FILLET7_R, 180, 90)
            Line((0, FILLET7_R), (0, 0))
            Line((0, 0), (FILLET7_R, 0))
        make_face()
    extrude(amount=24.638, mode=Mode.SUBTRACT)

    # Fillet10
    fillet10_edges = [part.edges().sort_by_distance(p)[0] for p in [
        (7.914574134, 3.175, 15.145744177),
        (7.914574134, 0, 15.145744177),
        (-17.485425866, 0, -4.007219009),
        (7.914574134, 0, -23.160182195),
        (33.314574134, 0, -4.007219009),
        (29.594830255, 0, 11.426000298),
        (29.594830255, 0, -19.440438316),
        (-13.765681988, 0, -19.440438316),
        (-13.765681988, 0, 11.426000298),
        (-17.485425866, 3.175, -4.007219009),
        (33.314574134, 3.175, -4.007219009),
        (7.914574134, 3.175, -23.160182195),
    ]]
    fillet(fillet10_edges, radius=FILLET10_R - 0.0001)  # a hair under: the kernel refuses the full size


solid = part.part
